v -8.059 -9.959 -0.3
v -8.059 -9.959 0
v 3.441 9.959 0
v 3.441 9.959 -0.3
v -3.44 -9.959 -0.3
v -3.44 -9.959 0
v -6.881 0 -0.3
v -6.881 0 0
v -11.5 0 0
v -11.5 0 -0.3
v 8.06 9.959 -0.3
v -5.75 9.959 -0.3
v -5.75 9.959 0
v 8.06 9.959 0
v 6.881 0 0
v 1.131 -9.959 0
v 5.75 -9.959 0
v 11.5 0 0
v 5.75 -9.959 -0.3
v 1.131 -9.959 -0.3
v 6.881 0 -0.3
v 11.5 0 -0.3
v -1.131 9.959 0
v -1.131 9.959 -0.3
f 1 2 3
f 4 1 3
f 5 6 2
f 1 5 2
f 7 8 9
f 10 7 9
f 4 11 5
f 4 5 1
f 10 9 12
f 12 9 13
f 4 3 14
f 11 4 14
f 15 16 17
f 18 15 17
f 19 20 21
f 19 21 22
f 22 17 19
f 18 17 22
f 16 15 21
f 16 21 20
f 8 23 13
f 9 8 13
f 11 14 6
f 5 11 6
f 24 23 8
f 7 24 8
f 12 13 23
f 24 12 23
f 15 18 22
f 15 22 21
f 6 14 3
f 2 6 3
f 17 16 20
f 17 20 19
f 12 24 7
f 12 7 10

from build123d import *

# Parameters (mm, degrees)
ESTRUSIONE_ESTRUSIONE1_DEPTH   = 0.3
ESTRUSIONE_ESTRUSIONE1_2_DEPTH = 0.3
ESTRUSIONE_ESTRUSIONE1_3_DEPTH = 0.3


with BuildPart() as part:
    # Schizzo1 → Estrusione-Estrusione1 (new body)
    with BuildSketch(Plane.XY):
        Polygon((-1.131197846, 9.959292144), (-6.881197846, 0), (-11.5, 0), (-5.75, 9.959292144), align=None)
    extrude(amount=-ESTRUSIONE_ESTRUSIONE1_DEPTH)


with BuildPart() as body_2:
    # Schizzo1 → Estrusione-Estrusione1 2 (new body)
    with BuildSketch(Plane.XY):
        Polygon((5.75, -9.959292144), (11.5, 0), (6.881197846, 0), (1.131197846, -9.959292144), align=None)
    extrude(amount=-ESTRUSIONE_ESTRUSIONE1_2_DEPTH)


with BuildPart() as body_3:
    # Schizzo1 → Estrusione-Estrusione1 3 (new body)
    with BuildSketch(Plane.XY):
        Polygon((3.441416285, 9.959292144), (8.060218439, 9.959292144), (-3.439781561, -9.959292144), (-8.058583715, -9.959292144), align=None)
    extrude(amount=-ESTRUSIONE_ESTRUSIONE1_3_DEPTH)


solid = Compound([part.part, body_2.part, body_3.part])
